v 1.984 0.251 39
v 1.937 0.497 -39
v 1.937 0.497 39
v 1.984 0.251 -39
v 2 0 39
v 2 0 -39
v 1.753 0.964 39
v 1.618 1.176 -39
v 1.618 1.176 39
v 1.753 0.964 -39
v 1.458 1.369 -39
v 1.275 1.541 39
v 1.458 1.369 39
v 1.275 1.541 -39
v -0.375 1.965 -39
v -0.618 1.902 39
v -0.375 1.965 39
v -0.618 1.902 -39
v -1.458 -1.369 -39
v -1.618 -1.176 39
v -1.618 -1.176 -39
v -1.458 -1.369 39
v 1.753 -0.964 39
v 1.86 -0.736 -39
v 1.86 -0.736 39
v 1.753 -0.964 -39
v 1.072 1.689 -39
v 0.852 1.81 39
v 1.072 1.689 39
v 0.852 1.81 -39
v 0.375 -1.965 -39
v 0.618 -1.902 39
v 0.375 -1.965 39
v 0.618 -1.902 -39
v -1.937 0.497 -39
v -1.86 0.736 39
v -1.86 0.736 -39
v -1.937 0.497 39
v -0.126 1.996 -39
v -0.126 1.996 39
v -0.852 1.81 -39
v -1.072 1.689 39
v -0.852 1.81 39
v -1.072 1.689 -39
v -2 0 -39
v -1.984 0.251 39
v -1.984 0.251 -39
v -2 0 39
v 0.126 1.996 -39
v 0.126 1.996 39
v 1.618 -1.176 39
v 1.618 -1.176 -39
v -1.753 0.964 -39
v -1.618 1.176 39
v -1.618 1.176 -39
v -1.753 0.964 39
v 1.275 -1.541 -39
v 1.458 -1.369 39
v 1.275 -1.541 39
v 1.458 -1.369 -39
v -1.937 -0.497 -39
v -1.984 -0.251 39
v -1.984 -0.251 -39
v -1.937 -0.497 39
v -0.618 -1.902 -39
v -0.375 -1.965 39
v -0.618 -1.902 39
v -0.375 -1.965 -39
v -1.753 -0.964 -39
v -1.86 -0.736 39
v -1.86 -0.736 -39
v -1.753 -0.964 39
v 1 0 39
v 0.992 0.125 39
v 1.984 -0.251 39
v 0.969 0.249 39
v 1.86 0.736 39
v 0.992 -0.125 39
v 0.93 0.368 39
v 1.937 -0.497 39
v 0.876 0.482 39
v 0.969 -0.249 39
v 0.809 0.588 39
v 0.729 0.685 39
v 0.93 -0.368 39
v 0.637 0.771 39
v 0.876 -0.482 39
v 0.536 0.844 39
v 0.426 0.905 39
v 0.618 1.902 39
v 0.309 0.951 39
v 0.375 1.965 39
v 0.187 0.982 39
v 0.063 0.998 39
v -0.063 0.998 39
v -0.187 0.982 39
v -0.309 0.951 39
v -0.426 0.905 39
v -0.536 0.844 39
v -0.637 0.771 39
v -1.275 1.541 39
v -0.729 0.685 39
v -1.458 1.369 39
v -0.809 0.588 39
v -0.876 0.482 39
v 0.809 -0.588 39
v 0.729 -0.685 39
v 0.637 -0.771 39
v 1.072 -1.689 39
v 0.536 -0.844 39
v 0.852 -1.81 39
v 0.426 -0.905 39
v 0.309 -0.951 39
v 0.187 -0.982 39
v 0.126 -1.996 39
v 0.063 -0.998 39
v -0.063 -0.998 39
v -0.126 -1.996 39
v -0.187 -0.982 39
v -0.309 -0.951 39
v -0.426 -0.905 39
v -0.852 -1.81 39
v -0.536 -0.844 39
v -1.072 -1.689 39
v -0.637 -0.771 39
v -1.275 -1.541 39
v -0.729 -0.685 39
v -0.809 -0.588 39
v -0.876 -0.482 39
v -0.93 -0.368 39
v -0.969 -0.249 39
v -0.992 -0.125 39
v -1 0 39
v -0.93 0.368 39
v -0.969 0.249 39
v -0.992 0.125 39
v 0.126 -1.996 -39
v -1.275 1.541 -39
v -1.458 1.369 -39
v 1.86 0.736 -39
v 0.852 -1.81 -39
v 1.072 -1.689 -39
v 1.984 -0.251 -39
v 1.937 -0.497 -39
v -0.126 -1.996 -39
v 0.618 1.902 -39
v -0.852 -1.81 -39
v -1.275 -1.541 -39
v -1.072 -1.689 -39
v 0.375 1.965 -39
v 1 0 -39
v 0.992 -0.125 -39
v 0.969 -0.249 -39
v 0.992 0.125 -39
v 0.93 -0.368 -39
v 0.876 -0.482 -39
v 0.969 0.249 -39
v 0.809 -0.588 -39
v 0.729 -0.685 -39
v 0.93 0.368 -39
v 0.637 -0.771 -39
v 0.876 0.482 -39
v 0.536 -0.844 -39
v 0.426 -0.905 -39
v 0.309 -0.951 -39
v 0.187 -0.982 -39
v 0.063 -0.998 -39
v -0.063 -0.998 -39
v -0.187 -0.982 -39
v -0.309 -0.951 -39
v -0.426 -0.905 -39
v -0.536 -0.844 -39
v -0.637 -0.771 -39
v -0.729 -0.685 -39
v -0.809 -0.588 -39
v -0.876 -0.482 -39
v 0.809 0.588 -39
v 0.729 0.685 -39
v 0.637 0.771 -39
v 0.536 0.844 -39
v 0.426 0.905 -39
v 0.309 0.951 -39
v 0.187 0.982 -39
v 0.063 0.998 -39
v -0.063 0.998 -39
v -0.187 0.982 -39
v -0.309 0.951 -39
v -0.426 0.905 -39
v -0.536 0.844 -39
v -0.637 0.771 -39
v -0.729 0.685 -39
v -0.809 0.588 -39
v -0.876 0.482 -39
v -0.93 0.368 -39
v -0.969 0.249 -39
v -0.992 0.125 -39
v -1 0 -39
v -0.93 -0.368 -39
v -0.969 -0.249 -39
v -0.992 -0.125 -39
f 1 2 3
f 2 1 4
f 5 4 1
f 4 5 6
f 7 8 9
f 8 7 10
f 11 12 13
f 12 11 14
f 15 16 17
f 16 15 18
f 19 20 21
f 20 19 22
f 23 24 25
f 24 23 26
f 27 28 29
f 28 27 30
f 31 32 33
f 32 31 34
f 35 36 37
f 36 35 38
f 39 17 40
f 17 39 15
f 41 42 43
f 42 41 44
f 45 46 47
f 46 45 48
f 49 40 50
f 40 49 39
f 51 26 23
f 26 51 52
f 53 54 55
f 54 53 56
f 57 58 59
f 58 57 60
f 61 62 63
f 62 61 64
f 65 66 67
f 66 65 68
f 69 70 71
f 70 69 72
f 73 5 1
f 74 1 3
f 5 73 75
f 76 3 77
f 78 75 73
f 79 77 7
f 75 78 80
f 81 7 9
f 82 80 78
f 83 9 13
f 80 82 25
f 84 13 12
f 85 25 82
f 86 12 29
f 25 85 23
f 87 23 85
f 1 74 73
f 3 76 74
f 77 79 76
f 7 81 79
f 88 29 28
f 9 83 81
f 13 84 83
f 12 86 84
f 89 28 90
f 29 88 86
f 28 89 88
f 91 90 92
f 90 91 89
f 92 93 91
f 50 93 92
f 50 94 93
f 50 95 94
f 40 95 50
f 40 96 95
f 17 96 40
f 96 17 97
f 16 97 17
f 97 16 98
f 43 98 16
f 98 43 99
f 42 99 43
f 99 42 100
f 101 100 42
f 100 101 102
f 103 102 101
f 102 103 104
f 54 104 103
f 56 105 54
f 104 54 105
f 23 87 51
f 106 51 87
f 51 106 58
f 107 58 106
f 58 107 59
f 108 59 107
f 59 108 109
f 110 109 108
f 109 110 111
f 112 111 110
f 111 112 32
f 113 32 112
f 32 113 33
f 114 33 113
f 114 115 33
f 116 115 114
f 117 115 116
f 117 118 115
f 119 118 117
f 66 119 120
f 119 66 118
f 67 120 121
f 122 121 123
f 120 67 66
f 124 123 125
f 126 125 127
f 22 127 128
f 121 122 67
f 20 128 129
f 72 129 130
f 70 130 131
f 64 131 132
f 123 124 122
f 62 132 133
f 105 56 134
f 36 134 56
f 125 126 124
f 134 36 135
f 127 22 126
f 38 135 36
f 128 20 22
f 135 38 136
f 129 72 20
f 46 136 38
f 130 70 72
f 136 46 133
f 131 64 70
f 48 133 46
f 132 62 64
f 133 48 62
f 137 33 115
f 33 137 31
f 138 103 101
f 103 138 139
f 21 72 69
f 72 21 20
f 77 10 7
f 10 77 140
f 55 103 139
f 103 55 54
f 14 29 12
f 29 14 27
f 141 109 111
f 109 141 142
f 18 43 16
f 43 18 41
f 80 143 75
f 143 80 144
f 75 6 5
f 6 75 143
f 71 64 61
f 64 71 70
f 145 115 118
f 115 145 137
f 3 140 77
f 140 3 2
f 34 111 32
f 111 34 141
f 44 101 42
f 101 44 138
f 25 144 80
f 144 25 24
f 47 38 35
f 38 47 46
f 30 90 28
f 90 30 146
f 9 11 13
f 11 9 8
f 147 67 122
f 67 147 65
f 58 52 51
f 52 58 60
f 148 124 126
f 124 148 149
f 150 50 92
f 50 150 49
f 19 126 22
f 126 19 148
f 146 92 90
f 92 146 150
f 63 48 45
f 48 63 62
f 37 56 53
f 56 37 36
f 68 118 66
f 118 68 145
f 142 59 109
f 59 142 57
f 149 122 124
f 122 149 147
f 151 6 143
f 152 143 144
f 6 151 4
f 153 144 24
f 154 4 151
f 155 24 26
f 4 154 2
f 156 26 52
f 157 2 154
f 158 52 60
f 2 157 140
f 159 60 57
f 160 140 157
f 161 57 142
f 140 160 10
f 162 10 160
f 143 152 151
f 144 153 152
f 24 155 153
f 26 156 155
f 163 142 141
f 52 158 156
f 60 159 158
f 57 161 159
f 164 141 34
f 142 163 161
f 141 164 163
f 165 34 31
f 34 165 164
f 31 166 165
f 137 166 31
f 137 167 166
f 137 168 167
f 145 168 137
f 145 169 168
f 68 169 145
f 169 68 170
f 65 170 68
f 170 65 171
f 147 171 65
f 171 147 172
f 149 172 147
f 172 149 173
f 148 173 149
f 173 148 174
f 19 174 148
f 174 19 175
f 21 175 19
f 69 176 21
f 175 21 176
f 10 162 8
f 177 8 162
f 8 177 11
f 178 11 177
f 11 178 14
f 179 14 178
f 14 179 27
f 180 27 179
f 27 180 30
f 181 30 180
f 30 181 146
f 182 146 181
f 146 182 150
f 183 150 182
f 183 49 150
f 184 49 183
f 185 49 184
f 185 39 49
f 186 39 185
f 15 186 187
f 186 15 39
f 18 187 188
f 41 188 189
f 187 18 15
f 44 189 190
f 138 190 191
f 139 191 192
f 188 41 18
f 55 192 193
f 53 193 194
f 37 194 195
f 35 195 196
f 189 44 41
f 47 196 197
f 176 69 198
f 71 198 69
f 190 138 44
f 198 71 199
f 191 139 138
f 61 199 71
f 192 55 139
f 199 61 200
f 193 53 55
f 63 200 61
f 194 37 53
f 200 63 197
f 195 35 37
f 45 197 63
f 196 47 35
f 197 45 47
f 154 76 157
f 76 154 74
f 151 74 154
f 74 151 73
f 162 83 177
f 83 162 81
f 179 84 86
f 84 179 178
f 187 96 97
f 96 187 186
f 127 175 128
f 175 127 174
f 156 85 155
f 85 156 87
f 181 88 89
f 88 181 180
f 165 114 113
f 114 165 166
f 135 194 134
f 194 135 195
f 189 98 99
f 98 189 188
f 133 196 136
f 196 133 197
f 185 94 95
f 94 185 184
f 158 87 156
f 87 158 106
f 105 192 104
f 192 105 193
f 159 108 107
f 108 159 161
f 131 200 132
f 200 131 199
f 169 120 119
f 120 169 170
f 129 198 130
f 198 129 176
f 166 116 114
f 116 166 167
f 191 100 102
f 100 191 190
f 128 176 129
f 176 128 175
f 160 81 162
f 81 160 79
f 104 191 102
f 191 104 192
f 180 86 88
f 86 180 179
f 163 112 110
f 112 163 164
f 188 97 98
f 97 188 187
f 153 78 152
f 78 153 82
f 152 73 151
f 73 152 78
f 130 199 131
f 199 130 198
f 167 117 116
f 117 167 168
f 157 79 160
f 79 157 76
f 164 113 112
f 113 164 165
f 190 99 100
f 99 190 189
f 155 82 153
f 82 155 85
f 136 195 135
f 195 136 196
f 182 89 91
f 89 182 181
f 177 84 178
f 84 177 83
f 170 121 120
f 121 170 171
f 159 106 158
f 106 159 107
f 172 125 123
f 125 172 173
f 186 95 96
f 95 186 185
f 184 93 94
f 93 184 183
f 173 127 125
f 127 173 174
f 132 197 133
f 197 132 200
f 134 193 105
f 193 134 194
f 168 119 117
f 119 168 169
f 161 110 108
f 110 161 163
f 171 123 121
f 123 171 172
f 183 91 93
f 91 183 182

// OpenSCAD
$fn = 50;


difference() {
	union() {
		translate(v = [0, 0, -39.0000000000]) {
			cylinder(h = 78, r = 2.0000000000);
		}
	}
	union() {
		translate(v = [0, 0, -100.0000000000]) {
			cylinder(h = 200, r = 1.0000000000);
		}
	}
}
